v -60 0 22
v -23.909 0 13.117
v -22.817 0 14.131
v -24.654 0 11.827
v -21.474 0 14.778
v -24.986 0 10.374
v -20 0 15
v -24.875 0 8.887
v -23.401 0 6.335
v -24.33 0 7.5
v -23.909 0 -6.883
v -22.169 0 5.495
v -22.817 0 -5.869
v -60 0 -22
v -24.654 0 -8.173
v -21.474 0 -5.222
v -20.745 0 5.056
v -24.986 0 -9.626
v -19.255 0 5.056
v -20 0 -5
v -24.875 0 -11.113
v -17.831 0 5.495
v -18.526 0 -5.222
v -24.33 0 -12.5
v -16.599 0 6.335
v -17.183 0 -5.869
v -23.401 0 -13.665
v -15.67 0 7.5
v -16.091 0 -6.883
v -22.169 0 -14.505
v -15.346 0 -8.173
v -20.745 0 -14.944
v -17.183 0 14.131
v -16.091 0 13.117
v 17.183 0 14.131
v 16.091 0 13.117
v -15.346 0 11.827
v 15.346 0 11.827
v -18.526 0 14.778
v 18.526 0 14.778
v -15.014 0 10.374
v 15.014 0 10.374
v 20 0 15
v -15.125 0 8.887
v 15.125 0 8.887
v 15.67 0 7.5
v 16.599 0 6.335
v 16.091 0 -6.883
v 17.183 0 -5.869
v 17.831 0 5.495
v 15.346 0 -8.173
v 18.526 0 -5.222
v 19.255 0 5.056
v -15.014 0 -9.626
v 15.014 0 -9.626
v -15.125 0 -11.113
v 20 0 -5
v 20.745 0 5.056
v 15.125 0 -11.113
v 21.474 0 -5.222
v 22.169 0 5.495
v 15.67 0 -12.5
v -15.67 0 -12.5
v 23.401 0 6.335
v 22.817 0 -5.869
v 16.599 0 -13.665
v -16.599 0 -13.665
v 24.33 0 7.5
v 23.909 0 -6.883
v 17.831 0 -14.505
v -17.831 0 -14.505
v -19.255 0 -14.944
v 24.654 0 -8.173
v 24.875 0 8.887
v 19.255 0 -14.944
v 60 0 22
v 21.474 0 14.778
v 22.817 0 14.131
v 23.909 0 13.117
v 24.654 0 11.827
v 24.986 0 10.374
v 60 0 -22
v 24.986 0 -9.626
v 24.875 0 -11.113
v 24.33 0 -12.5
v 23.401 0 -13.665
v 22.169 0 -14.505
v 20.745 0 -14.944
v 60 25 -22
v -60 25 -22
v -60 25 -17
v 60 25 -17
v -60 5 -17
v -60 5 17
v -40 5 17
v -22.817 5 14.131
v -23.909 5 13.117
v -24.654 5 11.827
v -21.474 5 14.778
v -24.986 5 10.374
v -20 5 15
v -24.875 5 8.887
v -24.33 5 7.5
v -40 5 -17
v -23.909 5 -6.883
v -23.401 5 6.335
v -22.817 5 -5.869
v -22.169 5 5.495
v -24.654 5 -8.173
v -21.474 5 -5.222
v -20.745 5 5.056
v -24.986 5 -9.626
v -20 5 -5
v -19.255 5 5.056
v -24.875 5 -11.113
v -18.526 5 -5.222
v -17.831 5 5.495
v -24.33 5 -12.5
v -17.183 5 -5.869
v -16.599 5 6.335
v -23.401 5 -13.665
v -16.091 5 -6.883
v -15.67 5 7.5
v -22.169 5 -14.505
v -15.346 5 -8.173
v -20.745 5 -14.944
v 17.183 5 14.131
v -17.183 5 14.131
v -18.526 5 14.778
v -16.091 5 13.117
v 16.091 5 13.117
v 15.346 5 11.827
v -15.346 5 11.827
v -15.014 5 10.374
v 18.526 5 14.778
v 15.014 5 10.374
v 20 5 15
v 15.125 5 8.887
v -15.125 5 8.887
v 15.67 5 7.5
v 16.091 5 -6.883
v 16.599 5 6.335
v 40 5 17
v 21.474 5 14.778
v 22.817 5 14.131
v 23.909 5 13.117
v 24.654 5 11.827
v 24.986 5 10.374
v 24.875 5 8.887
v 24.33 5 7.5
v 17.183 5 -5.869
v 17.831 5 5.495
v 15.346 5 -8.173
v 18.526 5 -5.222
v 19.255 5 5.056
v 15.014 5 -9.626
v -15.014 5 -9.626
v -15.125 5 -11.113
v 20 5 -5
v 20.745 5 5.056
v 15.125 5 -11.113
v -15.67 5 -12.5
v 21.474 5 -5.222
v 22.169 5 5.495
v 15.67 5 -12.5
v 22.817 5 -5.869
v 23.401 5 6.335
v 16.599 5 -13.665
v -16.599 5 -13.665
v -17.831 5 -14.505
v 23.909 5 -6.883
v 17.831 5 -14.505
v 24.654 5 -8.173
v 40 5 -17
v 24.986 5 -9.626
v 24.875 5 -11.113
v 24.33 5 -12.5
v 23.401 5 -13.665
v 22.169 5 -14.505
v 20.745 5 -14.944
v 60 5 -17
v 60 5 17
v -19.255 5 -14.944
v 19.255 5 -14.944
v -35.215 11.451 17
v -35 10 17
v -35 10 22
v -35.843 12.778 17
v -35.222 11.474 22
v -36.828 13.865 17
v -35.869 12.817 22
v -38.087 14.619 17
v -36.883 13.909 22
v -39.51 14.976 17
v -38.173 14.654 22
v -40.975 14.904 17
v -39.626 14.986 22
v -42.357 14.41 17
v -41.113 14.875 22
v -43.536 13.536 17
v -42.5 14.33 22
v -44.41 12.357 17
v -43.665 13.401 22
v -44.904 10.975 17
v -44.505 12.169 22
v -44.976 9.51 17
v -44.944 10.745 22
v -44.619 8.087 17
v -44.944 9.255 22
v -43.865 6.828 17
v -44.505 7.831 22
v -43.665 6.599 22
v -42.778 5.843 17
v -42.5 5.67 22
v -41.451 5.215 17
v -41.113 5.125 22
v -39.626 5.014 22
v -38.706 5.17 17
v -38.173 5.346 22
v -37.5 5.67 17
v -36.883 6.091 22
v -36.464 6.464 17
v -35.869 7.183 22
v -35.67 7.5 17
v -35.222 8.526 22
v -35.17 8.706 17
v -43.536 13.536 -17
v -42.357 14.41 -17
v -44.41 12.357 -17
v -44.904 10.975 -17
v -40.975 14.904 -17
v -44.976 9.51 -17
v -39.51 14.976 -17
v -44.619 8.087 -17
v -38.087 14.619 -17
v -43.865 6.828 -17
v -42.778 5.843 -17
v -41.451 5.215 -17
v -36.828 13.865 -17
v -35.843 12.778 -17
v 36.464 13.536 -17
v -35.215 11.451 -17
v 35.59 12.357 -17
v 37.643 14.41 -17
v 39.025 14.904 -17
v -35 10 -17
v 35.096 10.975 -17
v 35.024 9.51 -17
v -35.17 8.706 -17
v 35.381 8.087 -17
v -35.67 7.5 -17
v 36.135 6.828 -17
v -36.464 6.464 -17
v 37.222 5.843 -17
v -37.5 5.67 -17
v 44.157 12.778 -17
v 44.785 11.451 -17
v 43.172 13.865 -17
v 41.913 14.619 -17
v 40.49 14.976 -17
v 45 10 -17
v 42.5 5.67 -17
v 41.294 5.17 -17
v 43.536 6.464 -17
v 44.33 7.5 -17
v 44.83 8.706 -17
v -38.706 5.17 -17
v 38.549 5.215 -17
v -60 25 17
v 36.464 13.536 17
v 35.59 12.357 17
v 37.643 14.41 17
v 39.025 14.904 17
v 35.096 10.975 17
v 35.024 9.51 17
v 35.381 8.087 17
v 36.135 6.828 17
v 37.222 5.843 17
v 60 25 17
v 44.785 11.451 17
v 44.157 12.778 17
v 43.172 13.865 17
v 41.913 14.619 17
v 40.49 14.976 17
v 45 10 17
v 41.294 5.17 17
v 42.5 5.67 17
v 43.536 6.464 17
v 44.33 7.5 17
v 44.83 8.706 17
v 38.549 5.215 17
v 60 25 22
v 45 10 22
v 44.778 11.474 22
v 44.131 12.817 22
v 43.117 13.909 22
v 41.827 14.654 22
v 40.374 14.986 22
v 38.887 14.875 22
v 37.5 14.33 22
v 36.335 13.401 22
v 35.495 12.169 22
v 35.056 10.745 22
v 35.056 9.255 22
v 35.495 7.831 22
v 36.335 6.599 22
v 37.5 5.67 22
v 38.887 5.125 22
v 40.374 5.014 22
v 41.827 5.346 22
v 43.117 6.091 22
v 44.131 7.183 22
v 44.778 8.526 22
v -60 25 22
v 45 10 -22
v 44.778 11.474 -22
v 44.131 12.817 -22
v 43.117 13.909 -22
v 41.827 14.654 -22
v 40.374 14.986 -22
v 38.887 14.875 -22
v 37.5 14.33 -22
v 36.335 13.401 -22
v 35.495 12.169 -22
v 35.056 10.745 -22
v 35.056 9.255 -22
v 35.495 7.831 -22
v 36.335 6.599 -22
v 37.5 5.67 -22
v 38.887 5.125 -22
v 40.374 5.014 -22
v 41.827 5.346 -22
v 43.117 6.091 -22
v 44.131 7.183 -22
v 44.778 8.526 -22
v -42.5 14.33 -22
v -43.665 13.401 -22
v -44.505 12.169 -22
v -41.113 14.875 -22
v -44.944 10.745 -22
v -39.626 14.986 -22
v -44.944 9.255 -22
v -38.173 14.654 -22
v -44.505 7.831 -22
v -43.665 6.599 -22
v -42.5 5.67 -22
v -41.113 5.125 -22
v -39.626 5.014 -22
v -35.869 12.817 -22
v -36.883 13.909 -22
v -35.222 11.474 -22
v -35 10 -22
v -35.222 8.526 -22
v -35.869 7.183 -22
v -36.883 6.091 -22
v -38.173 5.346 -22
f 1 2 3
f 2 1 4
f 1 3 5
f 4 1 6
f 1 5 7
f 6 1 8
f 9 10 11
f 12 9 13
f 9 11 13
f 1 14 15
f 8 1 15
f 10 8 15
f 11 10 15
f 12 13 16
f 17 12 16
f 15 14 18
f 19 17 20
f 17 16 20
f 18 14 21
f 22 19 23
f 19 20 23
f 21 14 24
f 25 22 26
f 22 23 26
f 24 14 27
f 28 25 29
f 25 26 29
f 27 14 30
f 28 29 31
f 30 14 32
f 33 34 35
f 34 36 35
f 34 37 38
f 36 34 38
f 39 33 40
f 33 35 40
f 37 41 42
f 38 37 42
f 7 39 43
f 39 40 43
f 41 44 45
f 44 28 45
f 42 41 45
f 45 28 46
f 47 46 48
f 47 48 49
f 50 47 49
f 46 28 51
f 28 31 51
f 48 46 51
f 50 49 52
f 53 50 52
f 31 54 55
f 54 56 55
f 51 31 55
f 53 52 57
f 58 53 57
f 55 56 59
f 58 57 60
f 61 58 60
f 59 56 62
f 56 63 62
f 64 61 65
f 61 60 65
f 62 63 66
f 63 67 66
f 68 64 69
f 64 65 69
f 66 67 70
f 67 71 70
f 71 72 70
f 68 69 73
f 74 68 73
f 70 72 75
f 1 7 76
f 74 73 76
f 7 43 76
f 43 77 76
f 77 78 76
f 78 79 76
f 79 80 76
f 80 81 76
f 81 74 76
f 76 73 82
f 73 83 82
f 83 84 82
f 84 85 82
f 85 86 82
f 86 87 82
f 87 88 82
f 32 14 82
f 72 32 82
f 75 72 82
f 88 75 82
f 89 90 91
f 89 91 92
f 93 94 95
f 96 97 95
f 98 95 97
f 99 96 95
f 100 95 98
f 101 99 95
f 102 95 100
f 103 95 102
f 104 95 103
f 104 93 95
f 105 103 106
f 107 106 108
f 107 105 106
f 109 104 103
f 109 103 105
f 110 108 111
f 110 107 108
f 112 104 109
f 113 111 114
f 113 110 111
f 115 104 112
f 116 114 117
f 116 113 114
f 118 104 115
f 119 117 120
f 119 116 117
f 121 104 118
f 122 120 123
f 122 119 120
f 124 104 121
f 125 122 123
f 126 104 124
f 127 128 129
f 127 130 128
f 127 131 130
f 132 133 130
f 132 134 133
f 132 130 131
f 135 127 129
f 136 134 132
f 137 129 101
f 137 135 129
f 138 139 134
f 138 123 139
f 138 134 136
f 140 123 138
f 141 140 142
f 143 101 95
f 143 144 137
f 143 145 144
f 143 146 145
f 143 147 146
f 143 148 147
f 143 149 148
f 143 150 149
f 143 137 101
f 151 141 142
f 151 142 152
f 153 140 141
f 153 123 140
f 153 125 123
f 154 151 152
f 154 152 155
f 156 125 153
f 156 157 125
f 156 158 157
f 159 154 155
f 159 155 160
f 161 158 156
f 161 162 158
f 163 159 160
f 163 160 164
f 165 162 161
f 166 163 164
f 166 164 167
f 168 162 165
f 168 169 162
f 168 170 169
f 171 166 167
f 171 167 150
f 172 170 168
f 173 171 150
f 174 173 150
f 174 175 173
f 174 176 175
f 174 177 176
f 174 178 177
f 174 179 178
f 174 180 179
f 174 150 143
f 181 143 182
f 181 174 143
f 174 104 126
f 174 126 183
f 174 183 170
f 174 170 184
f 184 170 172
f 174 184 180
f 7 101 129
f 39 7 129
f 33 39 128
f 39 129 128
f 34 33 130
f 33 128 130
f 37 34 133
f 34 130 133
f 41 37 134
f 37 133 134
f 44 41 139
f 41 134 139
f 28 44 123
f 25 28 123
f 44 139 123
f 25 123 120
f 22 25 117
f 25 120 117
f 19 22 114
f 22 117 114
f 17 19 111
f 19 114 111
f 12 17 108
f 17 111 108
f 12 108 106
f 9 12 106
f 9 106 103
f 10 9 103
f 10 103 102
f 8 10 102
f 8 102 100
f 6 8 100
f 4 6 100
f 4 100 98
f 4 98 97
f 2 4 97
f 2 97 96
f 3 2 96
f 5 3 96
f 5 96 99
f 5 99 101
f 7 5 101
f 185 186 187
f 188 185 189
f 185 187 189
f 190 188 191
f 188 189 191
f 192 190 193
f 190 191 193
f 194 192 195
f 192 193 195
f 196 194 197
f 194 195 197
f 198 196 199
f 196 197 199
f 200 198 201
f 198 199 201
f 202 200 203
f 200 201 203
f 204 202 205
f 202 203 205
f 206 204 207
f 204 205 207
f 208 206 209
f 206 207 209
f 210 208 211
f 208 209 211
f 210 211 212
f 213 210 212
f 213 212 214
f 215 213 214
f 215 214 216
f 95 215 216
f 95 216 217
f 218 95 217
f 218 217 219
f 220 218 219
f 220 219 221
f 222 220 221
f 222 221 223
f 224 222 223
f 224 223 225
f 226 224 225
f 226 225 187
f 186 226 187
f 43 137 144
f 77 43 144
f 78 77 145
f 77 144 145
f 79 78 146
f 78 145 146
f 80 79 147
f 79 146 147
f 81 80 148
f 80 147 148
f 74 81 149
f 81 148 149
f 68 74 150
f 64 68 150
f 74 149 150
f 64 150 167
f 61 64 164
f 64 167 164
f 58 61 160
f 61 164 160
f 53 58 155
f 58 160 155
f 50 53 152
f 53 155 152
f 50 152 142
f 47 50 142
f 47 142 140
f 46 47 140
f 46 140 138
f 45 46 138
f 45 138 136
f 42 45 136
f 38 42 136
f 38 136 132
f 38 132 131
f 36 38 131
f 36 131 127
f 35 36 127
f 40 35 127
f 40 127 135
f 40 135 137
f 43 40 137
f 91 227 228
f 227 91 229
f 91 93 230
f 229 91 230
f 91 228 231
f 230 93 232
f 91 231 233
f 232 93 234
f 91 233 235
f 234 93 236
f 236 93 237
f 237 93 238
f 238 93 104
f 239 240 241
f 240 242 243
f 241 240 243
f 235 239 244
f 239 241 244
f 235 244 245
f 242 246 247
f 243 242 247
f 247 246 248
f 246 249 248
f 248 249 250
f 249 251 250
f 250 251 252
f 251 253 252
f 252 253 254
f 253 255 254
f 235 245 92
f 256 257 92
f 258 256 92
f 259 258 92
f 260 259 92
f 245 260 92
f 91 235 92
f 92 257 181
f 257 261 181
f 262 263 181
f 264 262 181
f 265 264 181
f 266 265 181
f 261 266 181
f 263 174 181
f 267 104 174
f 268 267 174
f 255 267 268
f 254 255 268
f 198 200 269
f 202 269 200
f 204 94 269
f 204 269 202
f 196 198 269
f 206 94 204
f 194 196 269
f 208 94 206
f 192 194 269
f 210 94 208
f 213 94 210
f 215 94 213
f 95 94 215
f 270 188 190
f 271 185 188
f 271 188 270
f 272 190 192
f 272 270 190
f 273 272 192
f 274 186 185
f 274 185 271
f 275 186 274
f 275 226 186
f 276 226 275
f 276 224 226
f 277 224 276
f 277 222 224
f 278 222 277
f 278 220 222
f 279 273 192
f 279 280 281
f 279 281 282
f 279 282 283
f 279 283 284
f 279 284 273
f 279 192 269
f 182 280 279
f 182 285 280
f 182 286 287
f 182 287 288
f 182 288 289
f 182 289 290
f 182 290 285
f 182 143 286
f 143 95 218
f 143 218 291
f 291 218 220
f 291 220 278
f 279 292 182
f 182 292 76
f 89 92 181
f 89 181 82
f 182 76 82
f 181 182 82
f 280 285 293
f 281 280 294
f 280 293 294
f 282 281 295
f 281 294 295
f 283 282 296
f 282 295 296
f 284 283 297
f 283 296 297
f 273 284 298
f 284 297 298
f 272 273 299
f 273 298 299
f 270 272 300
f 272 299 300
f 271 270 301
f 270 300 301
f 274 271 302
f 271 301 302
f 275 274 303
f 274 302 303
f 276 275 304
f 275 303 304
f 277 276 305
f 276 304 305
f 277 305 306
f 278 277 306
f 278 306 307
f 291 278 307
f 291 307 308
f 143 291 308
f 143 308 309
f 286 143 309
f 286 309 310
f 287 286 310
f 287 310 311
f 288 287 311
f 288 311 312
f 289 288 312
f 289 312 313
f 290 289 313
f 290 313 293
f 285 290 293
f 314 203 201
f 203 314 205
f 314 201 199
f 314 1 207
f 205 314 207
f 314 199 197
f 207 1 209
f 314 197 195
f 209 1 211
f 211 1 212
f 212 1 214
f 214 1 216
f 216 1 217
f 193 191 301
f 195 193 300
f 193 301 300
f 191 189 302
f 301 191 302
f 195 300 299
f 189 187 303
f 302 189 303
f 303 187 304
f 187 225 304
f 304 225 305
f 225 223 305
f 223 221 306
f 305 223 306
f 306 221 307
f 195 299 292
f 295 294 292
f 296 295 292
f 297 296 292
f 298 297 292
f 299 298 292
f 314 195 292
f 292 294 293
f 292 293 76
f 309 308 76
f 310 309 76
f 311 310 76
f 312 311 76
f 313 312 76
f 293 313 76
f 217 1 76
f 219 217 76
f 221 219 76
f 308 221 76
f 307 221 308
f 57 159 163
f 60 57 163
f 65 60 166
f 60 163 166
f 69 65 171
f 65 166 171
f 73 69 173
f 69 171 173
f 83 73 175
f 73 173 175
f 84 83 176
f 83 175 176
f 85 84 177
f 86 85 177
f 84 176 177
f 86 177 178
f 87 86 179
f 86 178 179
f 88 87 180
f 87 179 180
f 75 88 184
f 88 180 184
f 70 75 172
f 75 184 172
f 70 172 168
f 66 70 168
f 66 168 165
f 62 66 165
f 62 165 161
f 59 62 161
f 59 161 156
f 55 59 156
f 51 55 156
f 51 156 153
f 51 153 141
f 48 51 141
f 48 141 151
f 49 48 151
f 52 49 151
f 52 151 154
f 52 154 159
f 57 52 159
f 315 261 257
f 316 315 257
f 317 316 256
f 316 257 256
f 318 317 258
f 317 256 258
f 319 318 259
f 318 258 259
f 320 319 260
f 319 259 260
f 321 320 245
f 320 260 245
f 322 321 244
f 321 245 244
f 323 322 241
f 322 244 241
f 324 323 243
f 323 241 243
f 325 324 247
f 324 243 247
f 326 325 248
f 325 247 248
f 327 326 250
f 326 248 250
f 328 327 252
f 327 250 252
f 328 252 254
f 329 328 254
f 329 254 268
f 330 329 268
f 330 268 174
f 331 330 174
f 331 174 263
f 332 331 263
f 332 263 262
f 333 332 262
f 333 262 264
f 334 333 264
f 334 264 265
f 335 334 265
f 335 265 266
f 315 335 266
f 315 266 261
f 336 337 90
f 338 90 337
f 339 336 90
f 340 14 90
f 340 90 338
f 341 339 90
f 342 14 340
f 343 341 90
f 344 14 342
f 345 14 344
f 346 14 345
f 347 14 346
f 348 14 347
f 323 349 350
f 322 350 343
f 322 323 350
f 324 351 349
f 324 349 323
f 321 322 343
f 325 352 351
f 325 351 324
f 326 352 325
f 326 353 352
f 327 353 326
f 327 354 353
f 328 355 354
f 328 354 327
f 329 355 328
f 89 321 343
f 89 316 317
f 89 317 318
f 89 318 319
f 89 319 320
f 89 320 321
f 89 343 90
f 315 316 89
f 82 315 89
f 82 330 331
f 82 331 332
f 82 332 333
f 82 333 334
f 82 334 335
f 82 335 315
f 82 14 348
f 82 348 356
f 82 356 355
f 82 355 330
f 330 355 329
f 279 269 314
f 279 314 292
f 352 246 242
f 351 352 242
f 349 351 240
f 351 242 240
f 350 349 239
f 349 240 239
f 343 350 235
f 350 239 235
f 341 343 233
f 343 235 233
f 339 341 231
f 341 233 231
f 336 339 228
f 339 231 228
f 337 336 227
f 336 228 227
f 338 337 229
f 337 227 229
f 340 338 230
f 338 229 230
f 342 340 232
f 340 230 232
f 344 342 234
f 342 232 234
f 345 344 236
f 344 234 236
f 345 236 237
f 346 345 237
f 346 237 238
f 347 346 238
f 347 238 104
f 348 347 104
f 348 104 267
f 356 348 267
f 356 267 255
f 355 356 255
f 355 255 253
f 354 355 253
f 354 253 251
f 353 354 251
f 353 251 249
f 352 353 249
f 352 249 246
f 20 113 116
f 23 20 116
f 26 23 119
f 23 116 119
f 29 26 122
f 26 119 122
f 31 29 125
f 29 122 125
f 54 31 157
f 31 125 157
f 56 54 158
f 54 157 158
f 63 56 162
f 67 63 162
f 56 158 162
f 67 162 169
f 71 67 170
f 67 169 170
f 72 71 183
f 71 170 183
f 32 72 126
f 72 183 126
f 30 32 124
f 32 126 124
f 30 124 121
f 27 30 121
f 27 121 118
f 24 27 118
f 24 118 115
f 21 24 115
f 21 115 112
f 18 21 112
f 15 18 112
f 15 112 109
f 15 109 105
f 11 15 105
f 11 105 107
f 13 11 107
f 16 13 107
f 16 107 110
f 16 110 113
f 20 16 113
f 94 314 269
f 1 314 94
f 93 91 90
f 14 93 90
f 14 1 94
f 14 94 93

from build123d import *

# Parameters (mm, degrees)
SKETCH1_W           = 120
SKETCH1_H           = 44
BOSS_EXTRUDE1_DEPTH = 5
SKETCH2_W           = 120
SKETCH2_H           = 5
BOSS_EXTRUDE2_DEPTH = 20
SKETCH3_R           = 5
CUT_EXTRUDE1_DEPTH  = 79.492037813
SKETCH4_R           = 5
CUT_EXTRUDE3_DEPTH  = 67.962676171


with BuildPart() as part:
    # Sketch1 → Boss-Extrude1 (new body)
    with BuildSketch(Plane(origin=(0, 0, 0), x_dir=(1, 0, 0), z_dir=(0, 1, 0))):
        Rectangle(SKETCH1_W, SKETCH1_H)
    extrude(amount=BOSS_EXTRUDE1_DEPTH)

    # Sketch2 → Boss-Extrude2 (add)
    with BuildSketch(Plane(origin=(0, 5, 0), x_dir=(1, 0, 0), z_dir=(0, 1, 0))):
        with Locations((0, 19.5)):
            Rectangle(SKETCH2_W, SKETCH2_H)
        with Locations((0, -19.5)):
            Rectangle(SKETCH2_W, SKETCH2_H)
    extrude(amount=BOSS_EXTRUDE2_DEPTH)

    # Sketch3 → Cut-Extrude1 (cut, through all)
    with BuildSketch(Plane.XY.offset(22)):
        with Locations((40, 10)):
            Circle(SKETCH3_R)
        with Locations((-40, 10)):
            Circle(SKETCH3_R)
    extrude(amount=-CUT_EXTRUDE1_DEPTH, mode=Mode.SUBTRACT)

    # Sketch4 → Cut-Extrude3 (cut, through all)
    with BuildSketch(Plane(origin=(0, 5, 0), x_dir=(1, 0, 0), z_dir=(0, 1, 0))):
        with Locations(Location((20, 10, 0), (0, 0, 270))):
            Circle(SKETCH4_R)
        with Locations(Location((20, -10, 0), (0, 0, 270))):
            Circle(SKETCH4_R)
        with Locations(Location((-20, 10, 0), (0, 0, 270))):
            Circle(SKETCH4_R)
        with Locations(Location((-20, -10, 0), (0, 0, 270))):
            Circle(SKETCH4_R)
    extrude(amount=-CUT_EXTRUDE3_DEPTH, mode=Mode.SUBTRACT)


solid = part.part
